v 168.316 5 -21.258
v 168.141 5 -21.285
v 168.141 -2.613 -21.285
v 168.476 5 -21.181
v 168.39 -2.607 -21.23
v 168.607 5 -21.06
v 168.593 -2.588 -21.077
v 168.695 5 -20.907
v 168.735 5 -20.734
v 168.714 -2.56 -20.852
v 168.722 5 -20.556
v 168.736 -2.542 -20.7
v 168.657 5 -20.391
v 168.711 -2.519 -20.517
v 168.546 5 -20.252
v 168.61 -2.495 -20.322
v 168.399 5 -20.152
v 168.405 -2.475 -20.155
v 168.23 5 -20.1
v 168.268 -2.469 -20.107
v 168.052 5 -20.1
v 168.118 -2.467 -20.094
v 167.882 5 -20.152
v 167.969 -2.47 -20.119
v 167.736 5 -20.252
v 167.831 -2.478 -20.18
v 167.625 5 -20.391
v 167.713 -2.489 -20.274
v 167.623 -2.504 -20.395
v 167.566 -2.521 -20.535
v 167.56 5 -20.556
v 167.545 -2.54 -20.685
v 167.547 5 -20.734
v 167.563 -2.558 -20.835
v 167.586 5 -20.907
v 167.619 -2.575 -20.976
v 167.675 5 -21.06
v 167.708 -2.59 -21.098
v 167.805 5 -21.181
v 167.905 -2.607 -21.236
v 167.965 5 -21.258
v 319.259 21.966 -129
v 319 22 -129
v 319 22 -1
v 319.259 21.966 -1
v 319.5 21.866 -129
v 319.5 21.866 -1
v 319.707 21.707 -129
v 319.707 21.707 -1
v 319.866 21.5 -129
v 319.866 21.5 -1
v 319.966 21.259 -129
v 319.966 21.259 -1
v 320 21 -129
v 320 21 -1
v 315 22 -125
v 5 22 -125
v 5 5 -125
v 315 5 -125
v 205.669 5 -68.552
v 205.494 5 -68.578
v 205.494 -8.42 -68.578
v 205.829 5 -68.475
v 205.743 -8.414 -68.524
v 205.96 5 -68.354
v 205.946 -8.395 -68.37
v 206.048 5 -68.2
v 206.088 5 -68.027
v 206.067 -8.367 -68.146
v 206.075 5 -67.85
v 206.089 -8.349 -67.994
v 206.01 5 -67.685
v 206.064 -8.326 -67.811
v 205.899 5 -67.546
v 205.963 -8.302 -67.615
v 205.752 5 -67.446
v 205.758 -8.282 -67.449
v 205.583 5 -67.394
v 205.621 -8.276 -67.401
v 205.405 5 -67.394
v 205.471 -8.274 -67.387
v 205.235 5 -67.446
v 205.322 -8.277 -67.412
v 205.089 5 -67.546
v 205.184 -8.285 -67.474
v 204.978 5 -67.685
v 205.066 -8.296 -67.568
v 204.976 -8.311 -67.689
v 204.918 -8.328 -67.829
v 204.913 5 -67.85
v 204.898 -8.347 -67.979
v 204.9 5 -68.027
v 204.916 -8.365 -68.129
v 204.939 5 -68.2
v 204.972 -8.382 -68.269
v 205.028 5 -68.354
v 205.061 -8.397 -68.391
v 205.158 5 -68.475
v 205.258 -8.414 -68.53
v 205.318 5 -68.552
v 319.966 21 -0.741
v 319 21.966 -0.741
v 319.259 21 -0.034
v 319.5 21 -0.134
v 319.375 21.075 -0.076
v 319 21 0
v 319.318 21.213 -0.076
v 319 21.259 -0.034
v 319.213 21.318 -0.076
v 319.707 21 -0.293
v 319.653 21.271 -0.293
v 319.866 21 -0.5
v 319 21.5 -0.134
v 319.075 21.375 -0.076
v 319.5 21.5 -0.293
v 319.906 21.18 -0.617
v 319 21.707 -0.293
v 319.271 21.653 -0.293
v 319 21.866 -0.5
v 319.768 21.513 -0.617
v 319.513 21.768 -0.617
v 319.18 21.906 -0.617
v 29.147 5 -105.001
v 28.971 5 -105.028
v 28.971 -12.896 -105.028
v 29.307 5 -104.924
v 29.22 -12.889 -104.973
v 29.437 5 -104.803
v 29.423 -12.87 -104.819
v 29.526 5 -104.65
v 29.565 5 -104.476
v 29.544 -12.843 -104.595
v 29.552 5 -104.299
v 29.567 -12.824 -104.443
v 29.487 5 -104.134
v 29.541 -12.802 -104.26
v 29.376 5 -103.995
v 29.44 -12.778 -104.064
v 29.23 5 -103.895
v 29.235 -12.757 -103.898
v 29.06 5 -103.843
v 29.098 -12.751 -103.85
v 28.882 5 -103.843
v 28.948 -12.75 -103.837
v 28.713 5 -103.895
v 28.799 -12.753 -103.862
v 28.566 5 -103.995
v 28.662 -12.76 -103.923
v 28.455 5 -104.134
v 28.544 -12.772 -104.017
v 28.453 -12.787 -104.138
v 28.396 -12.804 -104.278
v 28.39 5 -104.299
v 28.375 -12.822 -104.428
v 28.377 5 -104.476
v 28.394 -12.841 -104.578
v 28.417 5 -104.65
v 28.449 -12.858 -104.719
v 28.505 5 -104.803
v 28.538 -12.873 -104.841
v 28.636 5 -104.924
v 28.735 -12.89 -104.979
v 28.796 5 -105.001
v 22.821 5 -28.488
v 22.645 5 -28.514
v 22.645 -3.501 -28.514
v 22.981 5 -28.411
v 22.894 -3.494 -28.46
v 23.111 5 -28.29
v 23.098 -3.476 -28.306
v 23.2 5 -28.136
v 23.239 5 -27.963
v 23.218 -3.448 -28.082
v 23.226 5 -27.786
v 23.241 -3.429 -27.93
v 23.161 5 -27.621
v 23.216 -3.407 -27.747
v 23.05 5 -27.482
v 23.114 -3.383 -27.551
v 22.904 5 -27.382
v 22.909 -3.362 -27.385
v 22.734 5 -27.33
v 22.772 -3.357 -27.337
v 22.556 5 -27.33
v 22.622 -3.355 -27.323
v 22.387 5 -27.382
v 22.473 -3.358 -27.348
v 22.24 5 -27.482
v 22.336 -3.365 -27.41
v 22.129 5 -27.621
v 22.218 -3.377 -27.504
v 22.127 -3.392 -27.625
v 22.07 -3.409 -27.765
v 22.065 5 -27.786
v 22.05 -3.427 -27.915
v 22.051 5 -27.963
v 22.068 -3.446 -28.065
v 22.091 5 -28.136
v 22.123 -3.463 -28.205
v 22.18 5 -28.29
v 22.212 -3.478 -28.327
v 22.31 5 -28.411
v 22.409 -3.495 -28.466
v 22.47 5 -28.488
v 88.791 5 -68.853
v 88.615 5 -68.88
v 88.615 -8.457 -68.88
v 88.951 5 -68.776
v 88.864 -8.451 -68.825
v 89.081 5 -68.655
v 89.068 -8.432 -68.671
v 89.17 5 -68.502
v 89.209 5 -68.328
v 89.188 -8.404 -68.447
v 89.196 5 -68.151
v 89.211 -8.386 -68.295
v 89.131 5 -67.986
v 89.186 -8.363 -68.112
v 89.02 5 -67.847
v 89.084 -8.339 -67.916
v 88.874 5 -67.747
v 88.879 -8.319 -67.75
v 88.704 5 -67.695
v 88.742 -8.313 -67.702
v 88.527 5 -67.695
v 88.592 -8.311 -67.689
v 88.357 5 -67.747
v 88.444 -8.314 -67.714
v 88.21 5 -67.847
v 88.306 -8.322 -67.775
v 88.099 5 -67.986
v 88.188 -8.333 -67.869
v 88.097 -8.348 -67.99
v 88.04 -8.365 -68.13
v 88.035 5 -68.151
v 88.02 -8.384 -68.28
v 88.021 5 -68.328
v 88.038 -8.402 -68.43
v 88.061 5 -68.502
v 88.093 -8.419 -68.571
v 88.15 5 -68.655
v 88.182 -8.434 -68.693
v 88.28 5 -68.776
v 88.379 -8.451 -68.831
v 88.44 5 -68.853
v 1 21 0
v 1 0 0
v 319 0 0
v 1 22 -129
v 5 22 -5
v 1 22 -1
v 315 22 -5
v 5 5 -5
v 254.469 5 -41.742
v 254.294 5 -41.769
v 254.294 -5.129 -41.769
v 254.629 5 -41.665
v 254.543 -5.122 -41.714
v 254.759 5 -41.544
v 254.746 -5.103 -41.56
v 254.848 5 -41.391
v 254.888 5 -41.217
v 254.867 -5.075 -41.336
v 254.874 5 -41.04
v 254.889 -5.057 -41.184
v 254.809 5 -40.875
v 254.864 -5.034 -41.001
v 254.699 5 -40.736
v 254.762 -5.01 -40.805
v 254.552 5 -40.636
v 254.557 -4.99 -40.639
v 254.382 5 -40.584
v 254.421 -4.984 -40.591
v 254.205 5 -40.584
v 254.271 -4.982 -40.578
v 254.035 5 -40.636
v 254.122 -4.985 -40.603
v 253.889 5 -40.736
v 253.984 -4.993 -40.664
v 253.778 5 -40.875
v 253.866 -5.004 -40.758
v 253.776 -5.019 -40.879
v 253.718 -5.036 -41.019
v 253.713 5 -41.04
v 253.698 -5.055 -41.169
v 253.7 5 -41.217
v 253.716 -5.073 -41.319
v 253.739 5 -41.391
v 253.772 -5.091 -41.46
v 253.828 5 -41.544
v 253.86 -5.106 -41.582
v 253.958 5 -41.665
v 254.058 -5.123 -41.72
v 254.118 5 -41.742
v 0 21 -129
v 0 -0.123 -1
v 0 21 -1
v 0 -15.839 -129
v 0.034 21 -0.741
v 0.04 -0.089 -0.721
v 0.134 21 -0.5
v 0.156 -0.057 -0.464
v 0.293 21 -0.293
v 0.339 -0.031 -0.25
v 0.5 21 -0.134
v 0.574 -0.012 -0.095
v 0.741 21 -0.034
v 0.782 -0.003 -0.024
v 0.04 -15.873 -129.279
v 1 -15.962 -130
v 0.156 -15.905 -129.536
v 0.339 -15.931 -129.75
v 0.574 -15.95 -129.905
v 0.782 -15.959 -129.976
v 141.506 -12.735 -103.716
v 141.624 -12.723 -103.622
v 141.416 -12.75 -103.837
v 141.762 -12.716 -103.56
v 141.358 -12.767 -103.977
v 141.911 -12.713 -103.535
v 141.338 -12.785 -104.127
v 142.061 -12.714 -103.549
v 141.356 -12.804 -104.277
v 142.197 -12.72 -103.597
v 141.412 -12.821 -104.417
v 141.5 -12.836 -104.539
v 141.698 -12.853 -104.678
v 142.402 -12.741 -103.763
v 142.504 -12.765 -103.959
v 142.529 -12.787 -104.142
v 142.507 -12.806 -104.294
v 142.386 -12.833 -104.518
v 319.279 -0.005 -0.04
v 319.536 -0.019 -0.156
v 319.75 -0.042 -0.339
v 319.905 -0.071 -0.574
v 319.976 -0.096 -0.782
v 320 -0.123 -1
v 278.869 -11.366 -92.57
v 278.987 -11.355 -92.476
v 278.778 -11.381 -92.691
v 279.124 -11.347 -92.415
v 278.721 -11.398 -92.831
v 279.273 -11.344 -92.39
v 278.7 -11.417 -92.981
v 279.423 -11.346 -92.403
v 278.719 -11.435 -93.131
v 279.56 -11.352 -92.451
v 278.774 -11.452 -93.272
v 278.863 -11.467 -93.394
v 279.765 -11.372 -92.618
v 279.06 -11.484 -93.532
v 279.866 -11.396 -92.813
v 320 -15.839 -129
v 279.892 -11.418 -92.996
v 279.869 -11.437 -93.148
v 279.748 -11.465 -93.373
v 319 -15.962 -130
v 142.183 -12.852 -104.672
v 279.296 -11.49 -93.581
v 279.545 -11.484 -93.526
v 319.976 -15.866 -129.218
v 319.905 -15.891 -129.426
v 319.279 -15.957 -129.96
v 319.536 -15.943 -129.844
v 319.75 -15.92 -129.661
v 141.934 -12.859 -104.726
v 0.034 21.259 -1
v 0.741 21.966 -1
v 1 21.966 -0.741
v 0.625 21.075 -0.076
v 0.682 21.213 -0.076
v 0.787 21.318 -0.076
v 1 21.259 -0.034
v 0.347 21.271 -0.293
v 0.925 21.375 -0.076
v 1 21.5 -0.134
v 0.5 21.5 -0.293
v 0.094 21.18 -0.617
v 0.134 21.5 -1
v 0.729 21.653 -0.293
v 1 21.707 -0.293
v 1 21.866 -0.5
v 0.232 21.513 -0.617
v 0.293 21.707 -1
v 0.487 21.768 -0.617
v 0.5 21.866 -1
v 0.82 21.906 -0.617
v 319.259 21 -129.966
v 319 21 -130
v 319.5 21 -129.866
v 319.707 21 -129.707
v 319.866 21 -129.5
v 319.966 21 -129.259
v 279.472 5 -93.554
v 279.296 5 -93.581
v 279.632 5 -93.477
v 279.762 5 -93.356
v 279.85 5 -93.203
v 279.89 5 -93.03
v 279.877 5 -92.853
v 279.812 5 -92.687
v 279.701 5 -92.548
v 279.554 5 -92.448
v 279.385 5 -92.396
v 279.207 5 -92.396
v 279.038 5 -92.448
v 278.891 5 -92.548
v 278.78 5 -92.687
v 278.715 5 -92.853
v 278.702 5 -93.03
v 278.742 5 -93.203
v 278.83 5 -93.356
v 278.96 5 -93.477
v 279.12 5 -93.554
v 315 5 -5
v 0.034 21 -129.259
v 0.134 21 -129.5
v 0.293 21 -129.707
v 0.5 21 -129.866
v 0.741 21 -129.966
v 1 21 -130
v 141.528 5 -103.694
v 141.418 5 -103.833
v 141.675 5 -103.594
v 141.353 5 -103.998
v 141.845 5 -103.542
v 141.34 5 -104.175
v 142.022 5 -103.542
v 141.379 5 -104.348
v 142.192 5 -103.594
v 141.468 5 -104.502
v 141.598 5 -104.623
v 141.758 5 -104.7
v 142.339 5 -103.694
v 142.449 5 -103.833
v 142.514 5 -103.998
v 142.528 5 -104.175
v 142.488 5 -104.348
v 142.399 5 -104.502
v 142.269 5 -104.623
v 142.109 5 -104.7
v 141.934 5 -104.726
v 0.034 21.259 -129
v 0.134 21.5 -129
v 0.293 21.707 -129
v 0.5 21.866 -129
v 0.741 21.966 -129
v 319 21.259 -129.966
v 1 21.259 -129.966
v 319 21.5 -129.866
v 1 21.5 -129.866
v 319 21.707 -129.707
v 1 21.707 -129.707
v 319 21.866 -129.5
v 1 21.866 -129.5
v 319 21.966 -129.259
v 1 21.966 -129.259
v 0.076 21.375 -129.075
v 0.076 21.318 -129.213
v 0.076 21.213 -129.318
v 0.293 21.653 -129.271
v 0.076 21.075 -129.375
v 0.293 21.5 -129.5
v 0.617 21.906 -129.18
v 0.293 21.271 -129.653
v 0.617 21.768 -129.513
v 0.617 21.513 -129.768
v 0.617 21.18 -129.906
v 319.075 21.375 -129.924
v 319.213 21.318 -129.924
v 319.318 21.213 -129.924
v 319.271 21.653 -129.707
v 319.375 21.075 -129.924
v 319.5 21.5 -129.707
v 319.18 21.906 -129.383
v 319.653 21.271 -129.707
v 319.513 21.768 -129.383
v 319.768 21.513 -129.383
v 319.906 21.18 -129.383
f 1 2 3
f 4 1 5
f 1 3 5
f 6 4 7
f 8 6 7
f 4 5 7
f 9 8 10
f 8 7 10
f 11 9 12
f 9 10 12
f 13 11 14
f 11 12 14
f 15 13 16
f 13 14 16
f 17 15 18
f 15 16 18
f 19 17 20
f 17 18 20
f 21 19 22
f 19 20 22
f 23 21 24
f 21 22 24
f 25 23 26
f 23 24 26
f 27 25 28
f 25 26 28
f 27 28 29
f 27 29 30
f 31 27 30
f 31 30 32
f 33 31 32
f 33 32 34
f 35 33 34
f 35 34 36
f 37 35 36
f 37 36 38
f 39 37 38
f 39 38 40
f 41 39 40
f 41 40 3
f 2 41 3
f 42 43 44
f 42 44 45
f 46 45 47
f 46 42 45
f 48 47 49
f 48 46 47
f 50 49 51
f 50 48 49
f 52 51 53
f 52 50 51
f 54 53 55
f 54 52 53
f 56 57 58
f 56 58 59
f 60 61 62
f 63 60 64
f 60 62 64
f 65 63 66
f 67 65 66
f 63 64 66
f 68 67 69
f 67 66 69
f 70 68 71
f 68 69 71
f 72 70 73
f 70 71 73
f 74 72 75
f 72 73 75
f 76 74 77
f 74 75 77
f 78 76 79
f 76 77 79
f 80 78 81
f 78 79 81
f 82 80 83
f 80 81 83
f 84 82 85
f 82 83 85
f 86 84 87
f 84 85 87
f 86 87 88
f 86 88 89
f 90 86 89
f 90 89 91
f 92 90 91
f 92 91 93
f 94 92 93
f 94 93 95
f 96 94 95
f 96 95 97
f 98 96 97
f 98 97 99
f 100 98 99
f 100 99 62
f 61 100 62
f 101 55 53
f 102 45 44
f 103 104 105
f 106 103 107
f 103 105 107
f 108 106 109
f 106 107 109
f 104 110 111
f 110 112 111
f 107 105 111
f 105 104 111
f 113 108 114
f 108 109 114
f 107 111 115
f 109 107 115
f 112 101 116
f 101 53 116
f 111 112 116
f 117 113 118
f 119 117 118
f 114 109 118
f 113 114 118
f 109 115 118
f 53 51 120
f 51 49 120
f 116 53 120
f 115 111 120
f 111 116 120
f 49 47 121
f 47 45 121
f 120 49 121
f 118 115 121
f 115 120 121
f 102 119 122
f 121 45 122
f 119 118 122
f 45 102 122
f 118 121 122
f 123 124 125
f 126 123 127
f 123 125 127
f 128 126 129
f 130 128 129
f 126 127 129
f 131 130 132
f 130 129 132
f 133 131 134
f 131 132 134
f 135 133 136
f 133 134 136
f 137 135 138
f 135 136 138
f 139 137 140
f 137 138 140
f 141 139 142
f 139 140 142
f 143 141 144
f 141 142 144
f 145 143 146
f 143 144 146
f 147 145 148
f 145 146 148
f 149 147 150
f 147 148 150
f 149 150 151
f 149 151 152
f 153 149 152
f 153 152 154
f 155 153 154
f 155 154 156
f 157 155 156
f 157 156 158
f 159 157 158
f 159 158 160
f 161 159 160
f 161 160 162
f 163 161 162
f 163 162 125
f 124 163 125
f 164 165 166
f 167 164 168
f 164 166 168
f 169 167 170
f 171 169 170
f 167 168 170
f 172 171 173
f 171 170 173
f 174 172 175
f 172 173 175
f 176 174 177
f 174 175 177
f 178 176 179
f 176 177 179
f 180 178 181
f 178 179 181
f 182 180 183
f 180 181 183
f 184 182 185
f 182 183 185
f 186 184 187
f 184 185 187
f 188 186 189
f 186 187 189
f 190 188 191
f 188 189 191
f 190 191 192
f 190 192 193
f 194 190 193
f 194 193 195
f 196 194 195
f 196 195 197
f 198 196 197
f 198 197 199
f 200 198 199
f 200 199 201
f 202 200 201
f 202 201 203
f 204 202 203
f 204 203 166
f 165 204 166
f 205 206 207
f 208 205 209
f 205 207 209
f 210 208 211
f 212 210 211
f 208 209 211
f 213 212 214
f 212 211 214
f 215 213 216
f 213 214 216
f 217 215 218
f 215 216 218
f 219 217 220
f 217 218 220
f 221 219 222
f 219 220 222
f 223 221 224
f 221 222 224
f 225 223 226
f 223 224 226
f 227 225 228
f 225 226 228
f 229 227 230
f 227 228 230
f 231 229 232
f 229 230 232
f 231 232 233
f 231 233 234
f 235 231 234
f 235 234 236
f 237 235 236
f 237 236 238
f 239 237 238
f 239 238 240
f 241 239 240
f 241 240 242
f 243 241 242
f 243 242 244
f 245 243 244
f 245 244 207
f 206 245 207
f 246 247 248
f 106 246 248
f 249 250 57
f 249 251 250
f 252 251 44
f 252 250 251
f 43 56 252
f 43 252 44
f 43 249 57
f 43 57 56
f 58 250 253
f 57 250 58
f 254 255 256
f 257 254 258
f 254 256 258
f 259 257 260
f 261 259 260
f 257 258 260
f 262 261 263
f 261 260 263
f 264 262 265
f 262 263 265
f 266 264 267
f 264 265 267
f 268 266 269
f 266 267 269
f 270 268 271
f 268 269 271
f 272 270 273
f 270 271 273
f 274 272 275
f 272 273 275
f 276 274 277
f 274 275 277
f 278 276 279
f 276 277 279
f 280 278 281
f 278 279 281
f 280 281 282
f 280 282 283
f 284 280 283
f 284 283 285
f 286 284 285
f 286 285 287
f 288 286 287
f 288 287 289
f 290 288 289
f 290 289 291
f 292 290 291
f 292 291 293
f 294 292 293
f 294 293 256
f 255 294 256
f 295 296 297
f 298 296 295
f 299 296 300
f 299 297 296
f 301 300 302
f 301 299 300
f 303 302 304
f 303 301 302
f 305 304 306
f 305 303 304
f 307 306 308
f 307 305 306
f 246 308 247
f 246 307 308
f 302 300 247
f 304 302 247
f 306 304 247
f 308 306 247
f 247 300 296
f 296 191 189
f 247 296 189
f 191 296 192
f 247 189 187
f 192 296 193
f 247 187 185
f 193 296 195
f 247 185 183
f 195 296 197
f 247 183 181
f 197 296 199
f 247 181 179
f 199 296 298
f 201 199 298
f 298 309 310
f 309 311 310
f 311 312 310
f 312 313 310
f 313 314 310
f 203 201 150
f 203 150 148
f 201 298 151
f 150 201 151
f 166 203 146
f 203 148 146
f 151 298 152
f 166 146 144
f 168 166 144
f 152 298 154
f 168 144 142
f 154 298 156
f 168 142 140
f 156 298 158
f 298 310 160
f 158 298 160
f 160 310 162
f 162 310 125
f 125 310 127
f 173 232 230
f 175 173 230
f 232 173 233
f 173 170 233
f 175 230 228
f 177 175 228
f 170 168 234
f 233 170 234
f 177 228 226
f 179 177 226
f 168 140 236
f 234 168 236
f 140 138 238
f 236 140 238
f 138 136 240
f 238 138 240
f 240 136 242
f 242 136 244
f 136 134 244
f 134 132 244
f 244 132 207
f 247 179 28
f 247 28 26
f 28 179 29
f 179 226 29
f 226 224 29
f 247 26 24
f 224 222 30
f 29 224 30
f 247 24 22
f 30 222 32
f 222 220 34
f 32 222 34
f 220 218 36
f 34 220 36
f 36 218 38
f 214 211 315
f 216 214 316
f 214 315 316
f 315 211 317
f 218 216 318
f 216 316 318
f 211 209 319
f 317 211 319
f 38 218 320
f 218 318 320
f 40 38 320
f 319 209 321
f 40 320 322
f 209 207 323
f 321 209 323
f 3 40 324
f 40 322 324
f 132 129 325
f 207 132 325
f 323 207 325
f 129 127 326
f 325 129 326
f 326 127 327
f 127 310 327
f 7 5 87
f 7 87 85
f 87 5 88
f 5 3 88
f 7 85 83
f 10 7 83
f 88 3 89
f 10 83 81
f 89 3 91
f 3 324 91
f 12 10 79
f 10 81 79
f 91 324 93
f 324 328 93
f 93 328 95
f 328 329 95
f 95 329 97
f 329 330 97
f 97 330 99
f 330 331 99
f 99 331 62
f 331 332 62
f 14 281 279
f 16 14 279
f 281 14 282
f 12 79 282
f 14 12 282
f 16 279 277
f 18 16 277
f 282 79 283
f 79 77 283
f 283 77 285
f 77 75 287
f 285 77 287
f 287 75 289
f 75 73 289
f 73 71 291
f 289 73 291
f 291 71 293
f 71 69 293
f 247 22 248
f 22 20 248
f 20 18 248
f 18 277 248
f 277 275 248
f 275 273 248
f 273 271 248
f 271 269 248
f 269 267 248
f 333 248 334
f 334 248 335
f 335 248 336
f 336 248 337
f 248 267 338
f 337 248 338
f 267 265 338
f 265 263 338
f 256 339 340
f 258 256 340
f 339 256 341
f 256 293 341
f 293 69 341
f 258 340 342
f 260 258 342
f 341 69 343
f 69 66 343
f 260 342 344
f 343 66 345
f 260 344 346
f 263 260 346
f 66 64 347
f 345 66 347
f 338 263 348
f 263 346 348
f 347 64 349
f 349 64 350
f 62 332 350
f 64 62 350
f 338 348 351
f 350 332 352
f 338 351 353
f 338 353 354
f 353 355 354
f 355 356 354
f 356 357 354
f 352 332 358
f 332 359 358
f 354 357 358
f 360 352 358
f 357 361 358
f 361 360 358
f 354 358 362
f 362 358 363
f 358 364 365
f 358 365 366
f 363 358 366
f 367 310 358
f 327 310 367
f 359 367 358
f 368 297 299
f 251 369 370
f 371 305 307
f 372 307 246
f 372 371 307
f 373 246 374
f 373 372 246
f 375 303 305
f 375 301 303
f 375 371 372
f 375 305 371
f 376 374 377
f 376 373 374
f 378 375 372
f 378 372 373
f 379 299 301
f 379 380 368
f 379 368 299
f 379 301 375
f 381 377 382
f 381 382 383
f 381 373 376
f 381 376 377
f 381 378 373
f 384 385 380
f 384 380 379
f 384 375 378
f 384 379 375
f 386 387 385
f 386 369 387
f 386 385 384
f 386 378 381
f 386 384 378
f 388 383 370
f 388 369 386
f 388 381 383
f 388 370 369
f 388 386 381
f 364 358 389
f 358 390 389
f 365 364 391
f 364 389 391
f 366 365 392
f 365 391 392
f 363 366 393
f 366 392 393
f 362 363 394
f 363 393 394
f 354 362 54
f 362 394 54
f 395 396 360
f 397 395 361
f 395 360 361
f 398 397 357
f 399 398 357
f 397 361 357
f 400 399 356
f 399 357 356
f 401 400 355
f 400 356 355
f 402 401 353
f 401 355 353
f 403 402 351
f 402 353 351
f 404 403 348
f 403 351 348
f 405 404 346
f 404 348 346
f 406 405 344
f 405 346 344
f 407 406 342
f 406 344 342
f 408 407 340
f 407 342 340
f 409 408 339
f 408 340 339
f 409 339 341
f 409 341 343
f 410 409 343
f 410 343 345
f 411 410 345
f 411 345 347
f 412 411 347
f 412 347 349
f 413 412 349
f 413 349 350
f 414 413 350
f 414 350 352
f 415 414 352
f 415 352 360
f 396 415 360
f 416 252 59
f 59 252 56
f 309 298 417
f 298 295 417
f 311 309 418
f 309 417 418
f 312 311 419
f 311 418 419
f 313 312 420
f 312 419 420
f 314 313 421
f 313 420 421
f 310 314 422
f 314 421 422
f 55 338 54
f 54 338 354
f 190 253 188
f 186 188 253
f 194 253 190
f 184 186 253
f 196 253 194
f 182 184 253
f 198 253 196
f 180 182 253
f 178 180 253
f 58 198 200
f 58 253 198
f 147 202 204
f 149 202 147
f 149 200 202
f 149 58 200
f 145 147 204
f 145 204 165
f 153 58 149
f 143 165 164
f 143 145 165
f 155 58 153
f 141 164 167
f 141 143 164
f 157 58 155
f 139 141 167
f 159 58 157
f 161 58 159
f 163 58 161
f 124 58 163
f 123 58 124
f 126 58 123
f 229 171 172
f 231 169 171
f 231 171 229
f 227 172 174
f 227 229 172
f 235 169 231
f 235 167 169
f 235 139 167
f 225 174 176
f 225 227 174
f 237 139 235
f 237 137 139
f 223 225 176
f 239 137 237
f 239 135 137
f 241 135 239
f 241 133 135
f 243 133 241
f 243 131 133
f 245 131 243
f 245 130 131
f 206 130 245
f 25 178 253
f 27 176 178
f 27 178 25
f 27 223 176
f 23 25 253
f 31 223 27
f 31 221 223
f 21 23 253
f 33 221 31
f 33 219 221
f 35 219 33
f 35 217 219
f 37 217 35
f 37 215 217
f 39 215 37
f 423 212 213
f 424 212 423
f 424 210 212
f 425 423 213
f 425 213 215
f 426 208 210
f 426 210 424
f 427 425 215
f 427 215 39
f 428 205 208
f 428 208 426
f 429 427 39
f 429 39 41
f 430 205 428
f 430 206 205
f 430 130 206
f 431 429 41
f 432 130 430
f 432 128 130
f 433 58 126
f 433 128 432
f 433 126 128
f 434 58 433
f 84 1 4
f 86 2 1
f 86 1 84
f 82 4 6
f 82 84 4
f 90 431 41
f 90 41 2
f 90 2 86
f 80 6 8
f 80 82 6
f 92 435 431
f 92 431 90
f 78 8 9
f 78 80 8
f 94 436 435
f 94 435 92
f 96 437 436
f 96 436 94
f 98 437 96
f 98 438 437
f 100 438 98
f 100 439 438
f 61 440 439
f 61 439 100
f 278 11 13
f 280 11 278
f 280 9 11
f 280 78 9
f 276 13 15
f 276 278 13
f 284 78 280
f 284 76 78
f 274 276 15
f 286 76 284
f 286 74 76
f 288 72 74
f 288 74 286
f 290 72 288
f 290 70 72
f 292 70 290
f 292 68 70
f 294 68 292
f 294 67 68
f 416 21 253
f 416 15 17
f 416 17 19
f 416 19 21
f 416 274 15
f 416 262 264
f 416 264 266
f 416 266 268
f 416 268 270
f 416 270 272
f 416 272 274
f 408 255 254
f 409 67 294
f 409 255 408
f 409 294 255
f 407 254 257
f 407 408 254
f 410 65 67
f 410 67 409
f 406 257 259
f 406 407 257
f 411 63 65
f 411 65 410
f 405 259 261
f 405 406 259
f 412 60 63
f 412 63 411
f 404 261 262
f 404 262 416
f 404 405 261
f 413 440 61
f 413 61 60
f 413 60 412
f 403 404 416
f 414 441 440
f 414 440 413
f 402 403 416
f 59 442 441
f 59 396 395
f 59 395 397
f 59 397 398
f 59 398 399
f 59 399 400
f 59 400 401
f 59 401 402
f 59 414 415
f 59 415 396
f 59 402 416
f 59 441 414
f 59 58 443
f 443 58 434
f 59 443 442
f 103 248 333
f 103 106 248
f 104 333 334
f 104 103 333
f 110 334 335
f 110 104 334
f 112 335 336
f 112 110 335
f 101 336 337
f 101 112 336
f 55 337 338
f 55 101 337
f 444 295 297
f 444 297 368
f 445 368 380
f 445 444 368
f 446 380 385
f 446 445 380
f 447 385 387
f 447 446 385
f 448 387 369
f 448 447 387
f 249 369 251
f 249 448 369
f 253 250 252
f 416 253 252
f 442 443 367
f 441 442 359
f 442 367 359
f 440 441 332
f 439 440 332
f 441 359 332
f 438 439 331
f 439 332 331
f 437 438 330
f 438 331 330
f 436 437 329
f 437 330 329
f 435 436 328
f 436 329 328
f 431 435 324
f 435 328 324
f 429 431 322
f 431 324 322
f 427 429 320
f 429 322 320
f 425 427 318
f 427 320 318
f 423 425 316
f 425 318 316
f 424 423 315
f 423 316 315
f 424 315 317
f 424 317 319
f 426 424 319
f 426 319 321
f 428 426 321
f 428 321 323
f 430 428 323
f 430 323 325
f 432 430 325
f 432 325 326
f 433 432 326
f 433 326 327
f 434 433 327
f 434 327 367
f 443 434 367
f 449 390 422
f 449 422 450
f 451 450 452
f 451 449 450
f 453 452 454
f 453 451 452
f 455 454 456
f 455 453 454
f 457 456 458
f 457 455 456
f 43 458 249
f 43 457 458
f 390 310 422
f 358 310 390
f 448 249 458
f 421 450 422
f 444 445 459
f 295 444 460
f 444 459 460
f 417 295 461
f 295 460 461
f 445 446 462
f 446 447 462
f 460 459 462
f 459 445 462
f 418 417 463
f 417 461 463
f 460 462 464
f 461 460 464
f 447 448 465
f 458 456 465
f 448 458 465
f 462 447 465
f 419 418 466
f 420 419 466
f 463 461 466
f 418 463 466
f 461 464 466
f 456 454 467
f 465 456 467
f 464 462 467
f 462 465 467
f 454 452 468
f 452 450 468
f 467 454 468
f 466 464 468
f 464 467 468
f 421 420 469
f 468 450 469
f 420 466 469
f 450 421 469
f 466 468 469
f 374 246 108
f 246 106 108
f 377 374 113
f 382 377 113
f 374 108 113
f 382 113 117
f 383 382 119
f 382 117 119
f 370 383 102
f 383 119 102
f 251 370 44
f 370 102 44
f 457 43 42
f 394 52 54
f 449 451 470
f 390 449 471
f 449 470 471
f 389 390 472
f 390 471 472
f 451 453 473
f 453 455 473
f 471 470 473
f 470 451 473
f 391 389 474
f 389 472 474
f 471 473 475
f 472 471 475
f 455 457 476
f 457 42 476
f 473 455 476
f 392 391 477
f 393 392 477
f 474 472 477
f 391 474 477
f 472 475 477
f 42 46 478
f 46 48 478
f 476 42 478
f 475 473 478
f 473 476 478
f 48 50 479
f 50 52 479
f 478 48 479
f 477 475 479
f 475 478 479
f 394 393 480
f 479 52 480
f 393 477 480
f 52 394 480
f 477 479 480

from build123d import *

# Parameters (mm, degrees)
SKETCH1_W             = 320
SKETCH1_H             = 130
BOSS_EXTRUDE3_DEPTH   = 22
SKETCH3_W             = 310
SKETCH3_H             = 120
CUT_EXTRUDE1_DEPTH    = 17
DRAFT1_ANGLE          = 7
FILLET2_R             = 1
F_0_80_TAPPED_HOLE1_D = 1.19126


with BuildPart() as part:
    # Sketch1 → Boss-Extrude3 (new body)
    with BuildSketch(Plane(origin=(0, 0, 0), x_dir=(1, 0, 0), z_dir=(0, 1, 0))):
        with Locations((160, 65)):
            Rectangle(SKETCH1_W, SKETCH1_H)
    extrude(amount=BOSS_EXTRUDE3_DEPTH)

    # Sketch3 → Cut-Extrude1 (cut)
    with BuildSketch(Plane(origin=(0, 22, 0), x_dir=(1, 0, 0), z_dir=(0, 1, 0))):
        with Locations((160, 65)):
            Rectangle(SKETCH3_W, SKETCH3_H)
    extrude(amount=-CUT_EXTRUDE1_DEPTH, mode=Mode.SUBTRACT)

    # Draft1
    draft1_faces = [part.faces().sort_by_distance(p)[0] for p in [
        (160, 0, -65),
    ]]
    draft(draft1_faces, Plane(origin=(0, 22, 0), x_dir=(1, 0, 0), z_dir=(0, 0, 1)), DRAFT1_ANGLE)

    # Fillet2
    fillet2_edges = [part.edges().sort_by_distance(p)[0] for p in [
        (320, 22, -65),
        (160, 22, -130),
        (0, 22, -65),
        (0, 3.019003541, -130),
        (320, 3.019003541, -130),
        (320, 11, 0),
        (0, 11, 0),
        (160, 22, 0),
    ]]
    fillet(fillet2_edges, radius=FILLET2_R)

    # #0-80 Tapped Hole1 (through all)
    with Locations(Plane(origin=(28.97111002, 5, -104.431910758), x_dir=(0, 0, 1), z_dir=(0, 1, 0))):
        with Locations((0, 0), (0.301233355, 112.962508169), (36.148002614, 59.644204314), (36.449235969, 176.522746099), (63.259004574, 225.322549628), (11.446867494, 250.324918103), (76.513272199, -6.325900457), (83.742872722, 139.169810064)):
            Hole(F_0_80_TAPPED_HOLE1_D / 2)


solid = part.part
